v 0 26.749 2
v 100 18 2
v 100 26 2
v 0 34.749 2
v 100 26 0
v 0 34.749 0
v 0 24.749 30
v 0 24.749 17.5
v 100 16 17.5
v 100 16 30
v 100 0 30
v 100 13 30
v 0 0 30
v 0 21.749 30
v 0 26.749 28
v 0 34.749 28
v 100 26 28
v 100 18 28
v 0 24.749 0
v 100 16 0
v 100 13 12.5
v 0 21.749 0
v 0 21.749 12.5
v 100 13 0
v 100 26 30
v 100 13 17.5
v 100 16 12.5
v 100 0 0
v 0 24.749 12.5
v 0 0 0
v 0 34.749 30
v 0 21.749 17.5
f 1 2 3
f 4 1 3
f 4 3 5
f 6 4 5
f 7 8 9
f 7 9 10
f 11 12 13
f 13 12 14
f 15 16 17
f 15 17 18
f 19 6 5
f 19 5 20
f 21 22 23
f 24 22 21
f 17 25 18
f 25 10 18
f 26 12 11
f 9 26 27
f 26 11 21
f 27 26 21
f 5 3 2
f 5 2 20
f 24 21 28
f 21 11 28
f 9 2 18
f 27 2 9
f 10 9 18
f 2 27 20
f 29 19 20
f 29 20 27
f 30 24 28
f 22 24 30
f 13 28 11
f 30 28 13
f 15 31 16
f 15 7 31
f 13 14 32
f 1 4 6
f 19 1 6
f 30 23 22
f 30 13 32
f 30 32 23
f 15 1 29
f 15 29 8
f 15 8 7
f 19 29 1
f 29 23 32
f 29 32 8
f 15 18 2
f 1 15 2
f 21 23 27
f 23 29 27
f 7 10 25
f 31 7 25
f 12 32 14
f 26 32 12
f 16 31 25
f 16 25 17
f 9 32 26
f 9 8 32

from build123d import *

# Parameters (mm, degrees)
SALIENTE_EXTRUIR1_DEPTH = 30
SALIENTE_EXTRUIR2_DEPTH = 2.5


with BuildPart() as part:
    # Croquis1 → Saliente-Extruir1 (new body)
    with BuildSketch(Plane.XY):
        Polygon((0, 0), (0, 21.748866353), (100, 13), (100, 0), align=None)
    extrude(amount=SALIENTE_EXTRUIR1_DEPTH)

    # Croquis3 → Saliente-Extruir2 (add, symmetric)
    with BuildSketch(Plane.XY.offset(15)):
        Polygon((0, 21.748866353), (100, 13), (100, 16), (0, 24.748866353), align=None)
    extrude(amount=SALIENTE_EXTRUIR2_DEPTH, both=True)

    # Barrer1: sweep along a path in Croquis4
    with BuildLine(Plane.XY.offset(15)) as barrer1_path:
        Line((0, 24.748866353), (100, 16))
    # Croquis5 → Barrer1 (sweep)
    with BuildSketch(Plane.ZY):
        Polygon((28, 34.748866353), (30, 34.748866353), (30, 24.748866353), (0, 24.748866353), (0, 34.748866353), (2, 34.748866353), (2, 26.748866353), (28, 26.748866353), align=None)
    sweep(path=barrer1_path.line)


solid = part.part
